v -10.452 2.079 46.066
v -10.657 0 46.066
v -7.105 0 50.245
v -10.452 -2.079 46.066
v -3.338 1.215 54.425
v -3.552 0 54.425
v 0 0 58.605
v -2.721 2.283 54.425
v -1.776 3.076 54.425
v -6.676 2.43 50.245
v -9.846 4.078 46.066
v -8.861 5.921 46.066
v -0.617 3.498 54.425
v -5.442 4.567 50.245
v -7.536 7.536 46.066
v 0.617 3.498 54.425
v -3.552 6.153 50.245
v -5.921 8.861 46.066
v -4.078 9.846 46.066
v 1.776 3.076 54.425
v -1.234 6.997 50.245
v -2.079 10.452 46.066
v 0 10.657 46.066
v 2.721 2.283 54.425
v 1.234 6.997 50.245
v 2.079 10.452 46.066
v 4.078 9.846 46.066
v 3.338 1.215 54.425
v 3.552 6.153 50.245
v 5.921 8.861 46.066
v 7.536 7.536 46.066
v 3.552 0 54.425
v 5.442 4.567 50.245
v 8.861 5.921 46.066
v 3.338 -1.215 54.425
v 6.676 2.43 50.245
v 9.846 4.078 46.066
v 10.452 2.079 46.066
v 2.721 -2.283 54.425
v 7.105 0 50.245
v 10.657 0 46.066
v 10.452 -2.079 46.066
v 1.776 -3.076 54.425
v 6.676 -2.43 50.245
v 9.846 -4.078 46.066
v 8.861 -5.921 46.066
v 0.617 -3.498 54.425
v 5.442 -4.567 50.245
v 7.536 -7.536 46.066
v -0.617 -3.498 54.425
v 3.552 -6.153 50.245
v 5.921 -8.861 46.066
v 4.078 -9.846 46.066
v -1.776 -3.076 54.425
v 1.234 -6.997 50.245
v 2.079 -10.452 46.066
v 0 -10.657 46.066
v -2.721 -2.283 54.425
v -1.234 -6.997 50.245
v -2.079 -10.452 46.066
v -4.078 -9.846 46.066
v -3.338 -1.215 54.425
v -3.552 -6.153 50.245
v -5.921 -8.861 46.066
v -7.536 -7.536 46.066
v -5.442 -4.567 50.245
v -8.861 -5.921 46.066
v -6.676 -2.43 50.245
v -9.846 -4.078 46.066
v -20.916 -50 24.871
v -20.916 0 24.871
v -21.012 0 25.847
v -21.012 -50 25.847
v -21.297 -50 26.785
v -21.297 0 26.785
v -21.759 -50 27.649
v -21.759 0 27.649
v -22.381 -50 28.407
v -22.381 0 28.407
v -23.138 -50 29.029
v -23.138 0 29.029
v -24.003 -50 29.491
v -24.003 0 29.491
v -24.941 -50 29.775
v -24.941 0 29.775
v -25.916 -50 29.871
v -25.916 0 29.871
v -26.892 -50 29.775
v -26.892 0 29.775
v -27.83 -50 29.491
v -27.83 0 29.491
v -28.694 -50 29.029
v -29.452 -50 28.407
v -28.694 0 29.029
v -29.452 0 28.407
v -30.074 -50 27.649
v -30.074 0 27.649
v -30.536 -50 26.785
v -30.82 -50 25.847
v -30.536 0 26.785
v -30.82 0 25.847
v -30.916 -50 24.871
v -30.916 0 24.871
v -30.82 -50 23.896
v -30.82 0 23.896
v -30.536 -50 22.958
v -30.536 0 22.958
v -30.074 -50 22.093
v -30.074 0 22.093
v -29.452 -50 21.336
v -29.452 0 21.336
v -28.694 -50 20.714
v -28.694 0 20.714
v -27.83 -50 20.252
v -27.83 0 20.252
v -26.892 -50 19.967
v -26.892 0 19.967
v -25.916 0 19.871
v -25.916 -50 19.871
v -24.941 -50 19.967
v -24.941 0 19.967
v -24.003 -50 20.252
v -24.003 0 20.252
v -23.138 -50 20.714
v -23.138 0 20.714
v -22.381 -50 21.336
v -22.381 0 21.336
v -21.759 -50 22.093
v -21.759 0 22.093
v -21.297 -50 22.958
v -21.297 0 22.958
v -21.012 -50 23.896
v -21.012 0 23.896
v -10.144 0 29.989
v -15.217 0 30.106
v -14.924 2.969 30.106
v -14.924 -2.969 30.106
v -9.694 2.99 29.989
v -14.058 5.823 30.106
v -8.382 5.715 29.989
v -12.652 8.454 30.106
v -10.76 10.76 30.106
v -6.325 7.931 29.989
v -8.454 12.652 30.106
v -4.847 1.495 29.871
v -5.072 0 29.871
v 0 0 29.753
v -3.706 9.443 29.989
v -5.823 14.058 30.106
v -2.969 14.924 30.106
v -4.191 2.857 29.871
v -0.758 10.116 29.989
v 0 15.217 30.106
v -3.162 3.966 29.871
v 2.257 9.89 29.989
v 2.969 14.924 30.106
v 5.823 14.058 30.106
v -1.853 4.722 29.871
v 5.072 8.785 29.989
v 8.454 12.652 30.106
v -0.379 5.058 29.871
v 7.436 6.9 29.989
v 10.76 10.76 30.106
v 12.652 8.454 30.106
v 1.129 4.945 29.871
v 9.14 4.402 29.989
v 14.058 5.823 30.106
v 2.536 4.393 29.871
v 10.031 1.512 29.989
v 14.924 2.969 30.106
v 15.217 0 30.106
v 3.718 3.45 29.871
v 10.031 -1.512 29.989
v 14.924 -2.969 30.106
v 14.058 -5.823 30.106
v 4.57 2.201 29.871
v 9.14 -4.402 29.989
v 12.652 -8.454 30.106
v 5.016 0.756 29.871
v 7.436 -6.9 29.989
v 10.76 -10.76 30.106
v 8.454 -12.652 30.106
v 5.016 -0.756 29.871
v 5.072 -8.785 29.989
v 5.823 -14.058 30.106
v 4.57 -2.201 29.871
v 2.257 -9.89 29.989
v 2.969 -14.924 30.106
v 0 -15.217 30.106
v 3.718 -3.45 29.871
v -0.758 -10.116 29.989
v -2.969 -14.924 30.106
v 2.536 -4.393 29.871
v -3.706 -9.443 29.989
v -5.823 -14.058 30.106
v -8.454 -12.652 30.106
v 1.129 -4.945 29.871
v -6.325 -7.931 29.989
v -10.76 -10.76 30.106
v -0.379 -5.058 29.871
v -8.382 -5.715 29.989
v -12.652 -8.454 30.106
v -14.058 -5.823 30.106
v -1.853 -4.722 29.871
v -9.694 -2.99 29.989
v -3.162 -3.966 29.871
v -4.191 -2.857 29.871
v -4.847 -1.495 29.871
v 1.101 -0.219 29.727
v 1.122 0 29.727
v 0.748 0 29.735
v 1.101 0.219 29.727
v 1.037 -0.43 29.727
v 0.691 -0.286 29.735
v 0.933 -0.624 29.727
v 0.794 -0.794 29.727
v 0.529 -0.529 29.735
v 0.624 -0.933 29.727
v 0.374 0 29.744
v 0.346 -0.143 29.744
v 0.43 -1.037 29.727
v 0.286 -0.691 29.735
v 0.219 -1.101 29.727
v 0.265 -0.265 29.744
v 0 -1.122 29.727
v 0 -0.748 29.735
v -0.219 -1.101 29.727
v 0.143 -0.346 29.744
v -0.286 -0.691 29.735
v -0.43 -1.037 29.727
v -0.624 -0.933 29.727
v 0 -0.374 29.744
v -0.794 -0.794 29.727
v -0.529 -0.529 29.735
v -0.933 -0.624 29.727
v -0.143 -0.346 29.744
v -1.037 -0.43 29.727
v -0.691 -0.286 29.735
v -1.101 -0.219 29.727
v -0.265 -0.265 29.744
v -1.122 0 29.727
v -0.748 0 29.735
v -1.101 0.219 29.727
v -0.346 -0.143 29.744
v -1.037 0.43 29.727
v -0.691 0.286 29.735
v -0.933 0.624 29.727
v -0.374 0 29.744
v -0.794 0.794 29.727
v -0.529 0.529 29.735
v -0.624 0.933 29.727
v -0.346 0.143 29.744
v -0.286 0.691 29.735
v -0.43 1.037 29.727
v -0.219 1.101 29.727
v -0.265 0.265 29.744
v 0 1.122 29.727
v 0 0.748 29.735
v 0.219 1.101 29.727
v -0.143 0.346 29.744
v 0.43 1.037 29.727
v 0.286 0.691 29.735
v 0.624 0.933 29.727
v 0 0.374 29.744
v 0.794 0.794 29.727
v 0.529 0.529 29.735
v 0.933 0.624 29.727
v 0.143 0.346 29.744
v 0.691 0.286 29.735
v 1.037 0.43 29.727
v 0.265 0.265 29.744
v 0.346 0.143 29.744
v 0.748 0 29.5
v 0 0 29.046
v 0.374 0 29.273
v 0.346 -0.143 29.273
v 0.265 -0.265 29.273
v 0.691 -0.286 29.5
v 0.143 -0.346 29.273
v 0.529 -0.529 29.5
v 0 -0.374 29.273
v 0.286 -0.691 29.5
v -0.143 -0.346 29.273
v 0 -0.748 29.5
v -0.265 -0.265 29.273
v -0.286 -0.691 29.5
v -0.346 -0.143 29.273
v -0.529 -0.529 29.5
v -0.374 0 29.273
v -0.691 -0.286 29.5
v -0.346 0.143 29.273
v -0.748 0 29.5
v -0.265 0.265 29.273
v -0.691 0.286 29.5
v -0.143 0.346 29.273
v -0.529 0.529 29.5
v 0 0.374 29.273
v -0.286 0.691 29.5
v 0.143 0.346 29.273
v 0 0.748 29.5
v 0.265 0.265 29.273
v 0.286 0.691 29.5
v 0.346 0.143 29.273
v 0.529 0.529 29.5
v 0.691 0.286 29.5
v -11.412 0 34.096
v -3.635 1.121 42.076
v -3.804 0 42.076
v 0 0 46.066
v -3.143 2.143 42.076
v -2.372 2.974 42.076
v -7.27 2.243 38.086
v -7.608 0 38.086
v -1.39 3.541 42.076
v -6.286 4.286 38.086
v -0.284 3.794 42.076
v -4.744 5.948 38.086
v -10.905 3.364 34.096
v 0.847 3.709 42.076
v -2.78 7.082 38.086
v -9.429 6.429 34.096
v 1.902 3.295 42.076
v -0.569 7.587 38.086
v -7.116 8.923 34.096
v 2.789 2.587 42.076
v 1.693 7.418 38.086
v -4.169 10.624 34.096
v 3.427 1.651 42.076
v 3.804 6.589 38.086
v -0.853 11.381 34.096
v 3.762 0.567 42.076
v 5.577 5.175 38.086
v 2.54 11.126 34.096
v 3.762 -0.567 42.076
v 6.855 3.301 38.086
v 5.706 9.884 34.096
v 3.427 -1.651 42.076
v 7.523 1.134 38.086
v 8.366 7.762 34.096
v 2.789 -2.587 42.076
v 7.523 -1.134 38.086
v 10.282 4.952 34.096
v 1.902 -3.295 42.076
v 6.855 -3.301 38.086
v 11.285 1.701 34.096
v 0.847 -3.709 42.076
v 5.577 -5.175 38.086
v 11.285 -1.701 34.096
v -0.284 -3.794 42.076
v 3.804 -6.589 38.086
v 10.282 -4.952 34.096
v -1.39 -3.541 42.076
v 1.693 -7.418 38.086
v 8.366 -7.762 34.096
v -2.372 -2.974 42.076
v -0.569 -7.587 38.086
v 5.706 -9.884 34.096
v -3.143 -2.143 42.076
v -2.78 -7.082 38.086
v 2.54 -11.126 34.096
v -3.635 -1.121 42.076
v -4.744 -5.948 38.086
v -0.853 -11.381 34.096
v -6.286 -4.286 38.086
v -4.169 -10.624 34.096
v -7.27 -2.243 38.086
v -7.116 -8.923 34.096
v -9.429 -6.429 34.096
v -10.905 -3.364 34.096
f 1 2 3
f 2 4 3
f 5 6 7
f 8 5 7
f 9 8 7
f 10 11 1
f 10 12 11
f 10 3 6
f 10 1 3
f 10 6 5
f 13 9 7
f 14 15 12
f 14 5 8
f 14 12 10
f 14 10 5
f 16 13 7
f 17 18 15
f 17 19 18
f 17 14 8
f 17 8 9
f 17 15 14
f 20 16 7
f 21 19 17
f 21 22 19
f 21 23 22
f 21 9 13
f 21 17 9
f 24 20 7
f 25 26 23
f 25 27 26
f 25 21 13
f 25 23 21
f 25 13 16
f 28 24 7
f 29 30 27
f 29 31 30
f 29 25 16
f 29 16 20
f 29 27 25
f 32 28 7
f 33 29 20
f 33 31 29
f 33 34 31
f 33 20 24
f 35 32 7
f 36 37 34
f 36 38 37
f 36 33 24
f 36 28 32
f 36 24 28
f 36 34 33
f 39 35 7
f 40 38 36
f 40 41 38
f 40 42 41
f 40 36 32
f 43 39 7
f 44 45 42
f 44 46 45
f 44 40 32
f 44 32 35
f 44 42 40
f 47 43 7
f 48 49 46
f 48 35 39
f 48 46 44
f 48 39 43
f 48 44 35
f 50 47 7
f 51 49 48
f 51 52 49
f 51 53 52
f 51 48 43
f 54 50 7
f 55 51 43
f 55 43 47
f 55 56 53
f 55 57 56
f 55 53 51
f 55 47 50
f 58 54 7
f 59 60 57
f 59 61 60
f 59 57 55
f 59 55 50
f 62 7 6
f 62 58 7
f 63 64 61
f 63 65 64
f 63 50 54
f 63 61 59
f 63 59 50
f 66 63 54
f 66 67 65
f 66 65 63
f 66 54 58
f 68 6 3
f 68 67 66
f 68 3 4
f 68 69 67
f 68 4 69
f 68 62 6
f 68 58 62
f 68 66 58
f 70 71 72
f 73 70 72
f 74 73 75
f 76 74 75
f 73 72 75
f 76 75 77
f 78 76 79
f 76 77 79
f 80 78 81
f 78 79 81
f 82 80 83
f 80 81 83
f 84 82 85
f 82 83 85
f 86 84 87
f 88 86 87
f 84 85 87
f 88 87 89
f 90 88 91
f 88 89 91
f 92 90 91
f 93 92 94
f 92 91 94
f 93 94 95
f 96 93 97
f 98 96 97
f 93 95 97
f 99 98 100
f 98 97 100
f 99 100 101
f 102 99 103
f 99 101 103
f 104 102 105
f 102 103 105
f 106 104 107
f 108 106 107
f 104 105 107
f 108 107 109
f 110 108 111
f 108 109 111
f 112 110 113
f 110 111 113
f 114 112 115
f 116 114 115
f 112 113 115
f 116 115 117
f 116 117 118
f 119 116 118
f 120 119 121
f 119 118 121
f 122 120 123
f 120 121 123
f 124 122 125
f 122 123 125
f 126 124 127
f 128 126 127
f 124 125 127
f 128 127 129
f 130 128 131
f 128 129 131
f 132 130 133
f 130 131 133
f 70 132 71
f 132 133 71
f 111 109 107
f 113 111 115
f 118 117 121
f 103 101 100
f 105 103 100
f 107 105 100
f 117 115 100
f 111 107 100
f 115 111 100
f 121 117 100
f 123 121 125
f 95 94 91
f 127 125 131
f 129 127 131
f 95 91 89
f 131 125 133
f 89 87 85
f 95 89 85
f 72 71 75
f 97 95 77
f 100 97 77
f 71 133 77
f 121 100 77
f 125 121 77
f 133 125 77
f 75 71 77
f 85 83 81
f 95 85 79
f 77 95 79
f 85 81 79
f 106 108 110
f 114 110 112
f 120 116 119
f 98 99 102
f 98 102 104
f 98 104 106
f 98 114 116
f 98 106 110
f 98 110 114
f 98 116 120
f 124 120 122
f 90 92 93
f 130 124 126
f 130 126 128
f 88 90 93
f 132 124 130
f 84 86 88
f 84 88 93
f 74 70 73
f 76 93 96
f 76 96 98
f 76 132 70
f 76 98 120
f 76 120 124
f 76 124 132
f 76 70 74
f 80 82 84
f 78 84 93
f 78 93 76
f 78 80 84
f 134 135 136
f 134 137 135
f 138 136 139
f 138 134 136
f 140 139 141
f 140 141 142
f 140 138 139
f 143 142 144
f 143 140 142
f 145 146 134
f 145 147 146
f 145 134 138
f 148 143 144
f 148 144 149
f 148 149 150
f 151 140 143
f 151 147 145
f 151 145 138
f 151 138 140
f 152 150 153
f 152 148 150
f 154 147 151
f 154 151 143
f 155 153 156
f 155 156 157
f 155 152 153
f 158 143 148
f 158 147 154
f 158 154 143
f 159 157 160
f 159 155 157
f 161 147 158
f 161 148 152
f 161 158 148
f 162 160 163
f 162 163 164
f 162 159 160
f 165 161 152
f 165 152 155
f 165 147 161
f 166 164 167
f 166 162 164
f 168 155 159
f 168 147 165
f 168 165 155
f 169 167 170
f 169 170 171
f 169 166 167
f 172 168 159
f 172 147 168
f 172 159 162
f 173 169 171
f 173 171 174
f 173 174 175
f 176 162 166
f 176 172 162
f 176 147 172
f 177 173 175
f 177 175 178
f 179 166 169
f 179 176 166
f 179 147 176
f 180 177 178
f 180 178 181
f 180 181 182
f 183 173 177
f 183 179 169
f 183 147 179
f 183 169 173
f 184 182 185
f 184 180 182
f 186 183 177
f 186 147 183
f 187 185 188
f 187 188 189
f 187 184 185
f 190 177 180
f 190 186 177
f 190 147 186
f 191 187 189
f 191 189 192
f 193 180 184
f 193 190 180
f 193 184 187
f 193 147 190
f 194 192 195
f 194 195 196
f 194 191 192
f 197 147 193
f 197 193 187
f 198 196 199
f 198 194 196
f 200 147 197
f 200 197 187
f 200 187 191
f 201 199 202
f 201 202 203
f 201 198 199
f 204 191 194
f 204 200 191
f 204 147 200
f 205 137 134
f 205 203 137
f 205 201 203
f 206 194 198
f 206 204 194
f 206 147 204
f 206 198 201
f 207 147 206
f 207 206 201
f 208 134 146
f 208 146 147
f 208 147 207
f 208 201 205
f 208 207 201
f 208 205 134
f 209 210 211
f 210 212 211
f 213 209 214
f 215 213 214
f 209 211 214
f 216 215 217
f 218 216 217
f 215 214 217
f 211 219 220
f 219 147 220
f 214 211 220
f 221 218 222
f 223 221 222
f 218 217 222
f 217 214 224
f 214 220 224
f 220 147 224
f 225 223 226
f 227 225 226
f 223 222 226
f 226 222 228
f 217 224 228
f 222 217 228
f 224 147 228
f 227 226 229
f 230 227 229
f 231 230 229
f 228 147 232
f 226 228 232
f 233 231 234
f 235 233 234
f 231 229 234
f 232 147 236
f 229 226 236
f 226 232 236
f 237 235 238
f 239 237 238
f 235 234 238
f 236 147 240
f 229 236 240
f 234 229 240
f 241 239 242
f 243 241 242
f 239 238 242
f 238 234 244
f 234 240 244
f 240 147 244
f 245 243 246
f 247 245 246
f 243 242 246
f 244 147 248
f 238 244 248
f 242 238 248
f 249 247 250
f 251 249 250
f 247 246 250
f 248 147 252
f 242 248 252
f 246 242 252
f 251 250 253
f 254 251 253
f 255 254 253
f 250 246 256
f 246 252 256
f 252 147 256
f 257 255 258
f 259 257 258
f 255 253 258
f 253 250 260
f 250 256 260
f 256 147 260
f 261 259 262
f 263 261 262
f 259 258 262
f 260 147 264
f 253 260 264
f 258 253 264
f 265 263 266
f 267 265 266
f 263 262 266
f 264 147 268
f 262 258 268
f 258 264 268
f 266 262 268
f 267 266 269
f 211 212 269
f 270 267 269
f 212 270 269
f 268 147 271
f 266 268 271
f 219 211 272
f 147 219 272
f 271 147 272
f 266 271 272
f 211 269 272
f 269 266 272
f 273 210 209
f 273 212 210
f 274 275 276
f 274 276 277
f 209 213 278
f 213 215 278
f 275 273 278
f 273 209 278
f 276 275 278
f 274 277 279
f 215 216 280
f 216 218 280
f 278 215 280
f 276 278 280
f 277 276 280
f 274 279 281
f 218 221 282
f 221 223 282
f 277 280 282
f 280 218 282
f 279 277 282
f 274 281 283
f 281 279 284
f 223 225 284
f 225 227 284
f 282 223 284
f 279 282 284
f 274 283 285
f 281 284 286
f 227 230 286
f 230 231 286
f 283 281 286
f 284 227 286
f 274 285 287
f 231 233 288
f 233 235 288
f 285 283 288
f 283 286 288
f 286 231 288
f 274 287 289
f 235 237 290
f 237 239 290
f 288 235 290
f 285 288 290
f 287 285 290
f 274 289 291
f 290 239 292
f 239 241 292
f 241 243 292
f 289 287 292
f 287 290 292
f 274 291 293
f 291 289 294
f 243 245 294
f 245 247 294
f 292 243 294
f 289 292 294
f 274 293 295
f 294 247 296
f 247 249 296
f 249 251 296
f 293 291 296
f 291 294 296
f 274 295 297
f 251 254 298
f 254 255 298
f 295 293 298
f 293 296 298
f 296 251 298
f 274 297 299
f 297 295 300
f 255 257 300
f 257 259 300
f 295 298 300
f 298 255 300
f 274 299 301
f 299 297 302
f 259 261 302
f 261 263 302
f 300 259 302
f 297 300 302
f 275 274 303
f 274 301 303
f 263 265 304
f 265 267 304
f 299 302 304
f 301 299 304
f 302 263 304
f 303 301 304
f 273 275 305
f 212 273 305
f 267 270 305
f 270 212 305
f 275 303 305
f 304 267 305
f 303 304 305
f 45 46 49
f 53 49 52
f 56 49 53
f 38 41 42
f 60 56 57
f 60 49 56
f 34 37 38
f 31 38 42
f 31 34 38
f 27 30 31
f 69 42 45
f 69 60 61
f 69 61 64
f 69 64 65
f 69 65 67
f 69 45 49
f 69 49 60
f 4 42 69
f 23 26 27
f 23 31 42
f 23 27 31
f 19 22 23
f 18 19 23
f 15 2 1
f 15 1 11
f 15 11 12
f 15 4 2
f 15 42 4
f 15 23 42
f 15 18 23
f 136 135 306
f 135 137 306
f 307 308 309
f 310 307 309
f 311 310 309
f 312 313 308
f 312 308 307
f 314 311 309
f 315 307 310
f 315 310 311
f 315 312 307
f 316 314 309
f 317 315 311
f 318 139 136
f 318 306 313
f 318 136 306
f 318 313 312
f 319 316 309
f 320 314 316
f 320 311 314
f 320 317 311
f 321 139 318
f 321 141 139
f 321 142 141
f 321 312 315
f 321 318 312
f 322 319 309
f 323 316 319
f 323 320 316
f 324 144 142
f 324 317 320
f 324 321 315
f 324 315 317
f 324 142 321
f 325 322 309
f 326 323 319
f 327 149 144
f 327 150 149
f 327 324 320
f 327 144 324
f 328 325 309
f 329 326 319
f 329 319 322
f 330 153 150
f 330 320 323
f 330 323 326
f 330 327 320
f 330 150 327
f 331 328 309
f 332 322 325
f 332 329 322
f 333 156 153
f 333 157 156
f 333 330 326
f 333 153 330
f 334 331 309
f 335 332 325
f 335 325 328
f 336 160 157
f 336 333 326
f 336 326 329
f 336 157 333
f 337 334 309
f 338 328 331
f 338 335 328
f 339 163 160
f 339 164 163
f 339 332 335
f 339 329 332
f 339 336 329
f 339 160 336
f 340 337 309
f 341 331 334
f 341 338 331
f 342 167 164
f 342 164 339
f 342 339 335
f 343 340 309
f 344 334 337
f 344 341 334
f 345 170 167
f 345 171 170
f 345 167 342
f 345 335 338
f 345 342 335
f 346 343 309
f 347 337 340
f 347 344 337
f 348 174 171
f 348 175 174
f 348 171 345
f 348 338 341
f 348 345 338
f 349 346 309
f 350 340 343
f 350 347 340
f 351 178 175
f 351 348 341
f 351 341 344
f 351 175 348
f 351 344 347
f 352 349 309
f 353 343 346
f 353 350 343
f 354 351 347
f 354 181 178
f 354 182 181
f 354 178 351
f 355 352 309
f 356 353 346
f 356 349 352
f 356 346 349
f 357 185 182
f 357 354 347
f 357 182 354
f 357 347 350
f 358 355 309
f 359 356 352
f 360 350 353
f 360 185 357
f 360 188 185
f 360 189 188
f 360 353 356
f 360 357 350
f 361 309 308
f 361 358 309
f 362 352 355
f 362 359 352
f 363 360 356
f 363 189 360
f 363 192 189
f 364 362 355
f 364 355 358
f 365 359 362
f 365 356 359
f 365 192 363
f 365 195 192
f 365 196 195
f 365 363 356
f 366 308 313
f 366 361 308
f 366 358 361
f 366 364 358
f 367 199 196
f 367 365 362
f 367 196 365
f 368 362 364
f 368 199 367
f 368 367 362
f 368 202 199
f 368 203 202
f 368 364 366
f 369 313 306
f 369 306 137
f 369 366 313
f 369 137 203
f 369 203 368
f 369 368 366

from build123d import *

# Parameters (mm, degrees)
F0_R     = 5
F1_DEPTH = 50


with BuildPart() as f1:
    # F0 (on Front) → F1 (new body)
    with BuildSketch(Plane.XZ):
        with Locations((-25.9163230658, 24.8713046312)):
            Circle(F0_R)
    extrude(amount=F1_DEPTH)


with BuildPart() as f3:
    # F2 (on Front) → F3 (revolve)
    with BuildSketch(Plane.XZ):
        Polygon((0, 46.0655391216), (0, 58.604799211), (-10.6569286436, 46.0655391216), align=None)
    revolve(axis=Axis((0, 0, 3.6980304867), (0, 0, -1)))


with BuildPart() as f3b:
    # F2 (on Front) → F3, piece 2 (revolve)
    with BuildSketch(Plane.XZ):
        Polygon((0, 29.7526032817), (0, 46.0655391216), (-15.2166634798, 30.1064774394), align=None)
    revolve(axis=Axis((0, 0, 3.6980304867), (0, 0, -1)))


with BuildPart() as f3c:
    # F2 (on Front) → F3, piece 3 (revolve)
    with BuildSketch(Plane.XZ):
        Polygon((1.1223797919, 29.7265015543), (0, 29.7526032817), (0, 29.0462713956), align=None)
    revolve(axis=Axis((0, 0, 3.6980304867), (0, 0, -1)))


solid = Compound([f1.part, f3.part, f3b.part, f3c.part])
